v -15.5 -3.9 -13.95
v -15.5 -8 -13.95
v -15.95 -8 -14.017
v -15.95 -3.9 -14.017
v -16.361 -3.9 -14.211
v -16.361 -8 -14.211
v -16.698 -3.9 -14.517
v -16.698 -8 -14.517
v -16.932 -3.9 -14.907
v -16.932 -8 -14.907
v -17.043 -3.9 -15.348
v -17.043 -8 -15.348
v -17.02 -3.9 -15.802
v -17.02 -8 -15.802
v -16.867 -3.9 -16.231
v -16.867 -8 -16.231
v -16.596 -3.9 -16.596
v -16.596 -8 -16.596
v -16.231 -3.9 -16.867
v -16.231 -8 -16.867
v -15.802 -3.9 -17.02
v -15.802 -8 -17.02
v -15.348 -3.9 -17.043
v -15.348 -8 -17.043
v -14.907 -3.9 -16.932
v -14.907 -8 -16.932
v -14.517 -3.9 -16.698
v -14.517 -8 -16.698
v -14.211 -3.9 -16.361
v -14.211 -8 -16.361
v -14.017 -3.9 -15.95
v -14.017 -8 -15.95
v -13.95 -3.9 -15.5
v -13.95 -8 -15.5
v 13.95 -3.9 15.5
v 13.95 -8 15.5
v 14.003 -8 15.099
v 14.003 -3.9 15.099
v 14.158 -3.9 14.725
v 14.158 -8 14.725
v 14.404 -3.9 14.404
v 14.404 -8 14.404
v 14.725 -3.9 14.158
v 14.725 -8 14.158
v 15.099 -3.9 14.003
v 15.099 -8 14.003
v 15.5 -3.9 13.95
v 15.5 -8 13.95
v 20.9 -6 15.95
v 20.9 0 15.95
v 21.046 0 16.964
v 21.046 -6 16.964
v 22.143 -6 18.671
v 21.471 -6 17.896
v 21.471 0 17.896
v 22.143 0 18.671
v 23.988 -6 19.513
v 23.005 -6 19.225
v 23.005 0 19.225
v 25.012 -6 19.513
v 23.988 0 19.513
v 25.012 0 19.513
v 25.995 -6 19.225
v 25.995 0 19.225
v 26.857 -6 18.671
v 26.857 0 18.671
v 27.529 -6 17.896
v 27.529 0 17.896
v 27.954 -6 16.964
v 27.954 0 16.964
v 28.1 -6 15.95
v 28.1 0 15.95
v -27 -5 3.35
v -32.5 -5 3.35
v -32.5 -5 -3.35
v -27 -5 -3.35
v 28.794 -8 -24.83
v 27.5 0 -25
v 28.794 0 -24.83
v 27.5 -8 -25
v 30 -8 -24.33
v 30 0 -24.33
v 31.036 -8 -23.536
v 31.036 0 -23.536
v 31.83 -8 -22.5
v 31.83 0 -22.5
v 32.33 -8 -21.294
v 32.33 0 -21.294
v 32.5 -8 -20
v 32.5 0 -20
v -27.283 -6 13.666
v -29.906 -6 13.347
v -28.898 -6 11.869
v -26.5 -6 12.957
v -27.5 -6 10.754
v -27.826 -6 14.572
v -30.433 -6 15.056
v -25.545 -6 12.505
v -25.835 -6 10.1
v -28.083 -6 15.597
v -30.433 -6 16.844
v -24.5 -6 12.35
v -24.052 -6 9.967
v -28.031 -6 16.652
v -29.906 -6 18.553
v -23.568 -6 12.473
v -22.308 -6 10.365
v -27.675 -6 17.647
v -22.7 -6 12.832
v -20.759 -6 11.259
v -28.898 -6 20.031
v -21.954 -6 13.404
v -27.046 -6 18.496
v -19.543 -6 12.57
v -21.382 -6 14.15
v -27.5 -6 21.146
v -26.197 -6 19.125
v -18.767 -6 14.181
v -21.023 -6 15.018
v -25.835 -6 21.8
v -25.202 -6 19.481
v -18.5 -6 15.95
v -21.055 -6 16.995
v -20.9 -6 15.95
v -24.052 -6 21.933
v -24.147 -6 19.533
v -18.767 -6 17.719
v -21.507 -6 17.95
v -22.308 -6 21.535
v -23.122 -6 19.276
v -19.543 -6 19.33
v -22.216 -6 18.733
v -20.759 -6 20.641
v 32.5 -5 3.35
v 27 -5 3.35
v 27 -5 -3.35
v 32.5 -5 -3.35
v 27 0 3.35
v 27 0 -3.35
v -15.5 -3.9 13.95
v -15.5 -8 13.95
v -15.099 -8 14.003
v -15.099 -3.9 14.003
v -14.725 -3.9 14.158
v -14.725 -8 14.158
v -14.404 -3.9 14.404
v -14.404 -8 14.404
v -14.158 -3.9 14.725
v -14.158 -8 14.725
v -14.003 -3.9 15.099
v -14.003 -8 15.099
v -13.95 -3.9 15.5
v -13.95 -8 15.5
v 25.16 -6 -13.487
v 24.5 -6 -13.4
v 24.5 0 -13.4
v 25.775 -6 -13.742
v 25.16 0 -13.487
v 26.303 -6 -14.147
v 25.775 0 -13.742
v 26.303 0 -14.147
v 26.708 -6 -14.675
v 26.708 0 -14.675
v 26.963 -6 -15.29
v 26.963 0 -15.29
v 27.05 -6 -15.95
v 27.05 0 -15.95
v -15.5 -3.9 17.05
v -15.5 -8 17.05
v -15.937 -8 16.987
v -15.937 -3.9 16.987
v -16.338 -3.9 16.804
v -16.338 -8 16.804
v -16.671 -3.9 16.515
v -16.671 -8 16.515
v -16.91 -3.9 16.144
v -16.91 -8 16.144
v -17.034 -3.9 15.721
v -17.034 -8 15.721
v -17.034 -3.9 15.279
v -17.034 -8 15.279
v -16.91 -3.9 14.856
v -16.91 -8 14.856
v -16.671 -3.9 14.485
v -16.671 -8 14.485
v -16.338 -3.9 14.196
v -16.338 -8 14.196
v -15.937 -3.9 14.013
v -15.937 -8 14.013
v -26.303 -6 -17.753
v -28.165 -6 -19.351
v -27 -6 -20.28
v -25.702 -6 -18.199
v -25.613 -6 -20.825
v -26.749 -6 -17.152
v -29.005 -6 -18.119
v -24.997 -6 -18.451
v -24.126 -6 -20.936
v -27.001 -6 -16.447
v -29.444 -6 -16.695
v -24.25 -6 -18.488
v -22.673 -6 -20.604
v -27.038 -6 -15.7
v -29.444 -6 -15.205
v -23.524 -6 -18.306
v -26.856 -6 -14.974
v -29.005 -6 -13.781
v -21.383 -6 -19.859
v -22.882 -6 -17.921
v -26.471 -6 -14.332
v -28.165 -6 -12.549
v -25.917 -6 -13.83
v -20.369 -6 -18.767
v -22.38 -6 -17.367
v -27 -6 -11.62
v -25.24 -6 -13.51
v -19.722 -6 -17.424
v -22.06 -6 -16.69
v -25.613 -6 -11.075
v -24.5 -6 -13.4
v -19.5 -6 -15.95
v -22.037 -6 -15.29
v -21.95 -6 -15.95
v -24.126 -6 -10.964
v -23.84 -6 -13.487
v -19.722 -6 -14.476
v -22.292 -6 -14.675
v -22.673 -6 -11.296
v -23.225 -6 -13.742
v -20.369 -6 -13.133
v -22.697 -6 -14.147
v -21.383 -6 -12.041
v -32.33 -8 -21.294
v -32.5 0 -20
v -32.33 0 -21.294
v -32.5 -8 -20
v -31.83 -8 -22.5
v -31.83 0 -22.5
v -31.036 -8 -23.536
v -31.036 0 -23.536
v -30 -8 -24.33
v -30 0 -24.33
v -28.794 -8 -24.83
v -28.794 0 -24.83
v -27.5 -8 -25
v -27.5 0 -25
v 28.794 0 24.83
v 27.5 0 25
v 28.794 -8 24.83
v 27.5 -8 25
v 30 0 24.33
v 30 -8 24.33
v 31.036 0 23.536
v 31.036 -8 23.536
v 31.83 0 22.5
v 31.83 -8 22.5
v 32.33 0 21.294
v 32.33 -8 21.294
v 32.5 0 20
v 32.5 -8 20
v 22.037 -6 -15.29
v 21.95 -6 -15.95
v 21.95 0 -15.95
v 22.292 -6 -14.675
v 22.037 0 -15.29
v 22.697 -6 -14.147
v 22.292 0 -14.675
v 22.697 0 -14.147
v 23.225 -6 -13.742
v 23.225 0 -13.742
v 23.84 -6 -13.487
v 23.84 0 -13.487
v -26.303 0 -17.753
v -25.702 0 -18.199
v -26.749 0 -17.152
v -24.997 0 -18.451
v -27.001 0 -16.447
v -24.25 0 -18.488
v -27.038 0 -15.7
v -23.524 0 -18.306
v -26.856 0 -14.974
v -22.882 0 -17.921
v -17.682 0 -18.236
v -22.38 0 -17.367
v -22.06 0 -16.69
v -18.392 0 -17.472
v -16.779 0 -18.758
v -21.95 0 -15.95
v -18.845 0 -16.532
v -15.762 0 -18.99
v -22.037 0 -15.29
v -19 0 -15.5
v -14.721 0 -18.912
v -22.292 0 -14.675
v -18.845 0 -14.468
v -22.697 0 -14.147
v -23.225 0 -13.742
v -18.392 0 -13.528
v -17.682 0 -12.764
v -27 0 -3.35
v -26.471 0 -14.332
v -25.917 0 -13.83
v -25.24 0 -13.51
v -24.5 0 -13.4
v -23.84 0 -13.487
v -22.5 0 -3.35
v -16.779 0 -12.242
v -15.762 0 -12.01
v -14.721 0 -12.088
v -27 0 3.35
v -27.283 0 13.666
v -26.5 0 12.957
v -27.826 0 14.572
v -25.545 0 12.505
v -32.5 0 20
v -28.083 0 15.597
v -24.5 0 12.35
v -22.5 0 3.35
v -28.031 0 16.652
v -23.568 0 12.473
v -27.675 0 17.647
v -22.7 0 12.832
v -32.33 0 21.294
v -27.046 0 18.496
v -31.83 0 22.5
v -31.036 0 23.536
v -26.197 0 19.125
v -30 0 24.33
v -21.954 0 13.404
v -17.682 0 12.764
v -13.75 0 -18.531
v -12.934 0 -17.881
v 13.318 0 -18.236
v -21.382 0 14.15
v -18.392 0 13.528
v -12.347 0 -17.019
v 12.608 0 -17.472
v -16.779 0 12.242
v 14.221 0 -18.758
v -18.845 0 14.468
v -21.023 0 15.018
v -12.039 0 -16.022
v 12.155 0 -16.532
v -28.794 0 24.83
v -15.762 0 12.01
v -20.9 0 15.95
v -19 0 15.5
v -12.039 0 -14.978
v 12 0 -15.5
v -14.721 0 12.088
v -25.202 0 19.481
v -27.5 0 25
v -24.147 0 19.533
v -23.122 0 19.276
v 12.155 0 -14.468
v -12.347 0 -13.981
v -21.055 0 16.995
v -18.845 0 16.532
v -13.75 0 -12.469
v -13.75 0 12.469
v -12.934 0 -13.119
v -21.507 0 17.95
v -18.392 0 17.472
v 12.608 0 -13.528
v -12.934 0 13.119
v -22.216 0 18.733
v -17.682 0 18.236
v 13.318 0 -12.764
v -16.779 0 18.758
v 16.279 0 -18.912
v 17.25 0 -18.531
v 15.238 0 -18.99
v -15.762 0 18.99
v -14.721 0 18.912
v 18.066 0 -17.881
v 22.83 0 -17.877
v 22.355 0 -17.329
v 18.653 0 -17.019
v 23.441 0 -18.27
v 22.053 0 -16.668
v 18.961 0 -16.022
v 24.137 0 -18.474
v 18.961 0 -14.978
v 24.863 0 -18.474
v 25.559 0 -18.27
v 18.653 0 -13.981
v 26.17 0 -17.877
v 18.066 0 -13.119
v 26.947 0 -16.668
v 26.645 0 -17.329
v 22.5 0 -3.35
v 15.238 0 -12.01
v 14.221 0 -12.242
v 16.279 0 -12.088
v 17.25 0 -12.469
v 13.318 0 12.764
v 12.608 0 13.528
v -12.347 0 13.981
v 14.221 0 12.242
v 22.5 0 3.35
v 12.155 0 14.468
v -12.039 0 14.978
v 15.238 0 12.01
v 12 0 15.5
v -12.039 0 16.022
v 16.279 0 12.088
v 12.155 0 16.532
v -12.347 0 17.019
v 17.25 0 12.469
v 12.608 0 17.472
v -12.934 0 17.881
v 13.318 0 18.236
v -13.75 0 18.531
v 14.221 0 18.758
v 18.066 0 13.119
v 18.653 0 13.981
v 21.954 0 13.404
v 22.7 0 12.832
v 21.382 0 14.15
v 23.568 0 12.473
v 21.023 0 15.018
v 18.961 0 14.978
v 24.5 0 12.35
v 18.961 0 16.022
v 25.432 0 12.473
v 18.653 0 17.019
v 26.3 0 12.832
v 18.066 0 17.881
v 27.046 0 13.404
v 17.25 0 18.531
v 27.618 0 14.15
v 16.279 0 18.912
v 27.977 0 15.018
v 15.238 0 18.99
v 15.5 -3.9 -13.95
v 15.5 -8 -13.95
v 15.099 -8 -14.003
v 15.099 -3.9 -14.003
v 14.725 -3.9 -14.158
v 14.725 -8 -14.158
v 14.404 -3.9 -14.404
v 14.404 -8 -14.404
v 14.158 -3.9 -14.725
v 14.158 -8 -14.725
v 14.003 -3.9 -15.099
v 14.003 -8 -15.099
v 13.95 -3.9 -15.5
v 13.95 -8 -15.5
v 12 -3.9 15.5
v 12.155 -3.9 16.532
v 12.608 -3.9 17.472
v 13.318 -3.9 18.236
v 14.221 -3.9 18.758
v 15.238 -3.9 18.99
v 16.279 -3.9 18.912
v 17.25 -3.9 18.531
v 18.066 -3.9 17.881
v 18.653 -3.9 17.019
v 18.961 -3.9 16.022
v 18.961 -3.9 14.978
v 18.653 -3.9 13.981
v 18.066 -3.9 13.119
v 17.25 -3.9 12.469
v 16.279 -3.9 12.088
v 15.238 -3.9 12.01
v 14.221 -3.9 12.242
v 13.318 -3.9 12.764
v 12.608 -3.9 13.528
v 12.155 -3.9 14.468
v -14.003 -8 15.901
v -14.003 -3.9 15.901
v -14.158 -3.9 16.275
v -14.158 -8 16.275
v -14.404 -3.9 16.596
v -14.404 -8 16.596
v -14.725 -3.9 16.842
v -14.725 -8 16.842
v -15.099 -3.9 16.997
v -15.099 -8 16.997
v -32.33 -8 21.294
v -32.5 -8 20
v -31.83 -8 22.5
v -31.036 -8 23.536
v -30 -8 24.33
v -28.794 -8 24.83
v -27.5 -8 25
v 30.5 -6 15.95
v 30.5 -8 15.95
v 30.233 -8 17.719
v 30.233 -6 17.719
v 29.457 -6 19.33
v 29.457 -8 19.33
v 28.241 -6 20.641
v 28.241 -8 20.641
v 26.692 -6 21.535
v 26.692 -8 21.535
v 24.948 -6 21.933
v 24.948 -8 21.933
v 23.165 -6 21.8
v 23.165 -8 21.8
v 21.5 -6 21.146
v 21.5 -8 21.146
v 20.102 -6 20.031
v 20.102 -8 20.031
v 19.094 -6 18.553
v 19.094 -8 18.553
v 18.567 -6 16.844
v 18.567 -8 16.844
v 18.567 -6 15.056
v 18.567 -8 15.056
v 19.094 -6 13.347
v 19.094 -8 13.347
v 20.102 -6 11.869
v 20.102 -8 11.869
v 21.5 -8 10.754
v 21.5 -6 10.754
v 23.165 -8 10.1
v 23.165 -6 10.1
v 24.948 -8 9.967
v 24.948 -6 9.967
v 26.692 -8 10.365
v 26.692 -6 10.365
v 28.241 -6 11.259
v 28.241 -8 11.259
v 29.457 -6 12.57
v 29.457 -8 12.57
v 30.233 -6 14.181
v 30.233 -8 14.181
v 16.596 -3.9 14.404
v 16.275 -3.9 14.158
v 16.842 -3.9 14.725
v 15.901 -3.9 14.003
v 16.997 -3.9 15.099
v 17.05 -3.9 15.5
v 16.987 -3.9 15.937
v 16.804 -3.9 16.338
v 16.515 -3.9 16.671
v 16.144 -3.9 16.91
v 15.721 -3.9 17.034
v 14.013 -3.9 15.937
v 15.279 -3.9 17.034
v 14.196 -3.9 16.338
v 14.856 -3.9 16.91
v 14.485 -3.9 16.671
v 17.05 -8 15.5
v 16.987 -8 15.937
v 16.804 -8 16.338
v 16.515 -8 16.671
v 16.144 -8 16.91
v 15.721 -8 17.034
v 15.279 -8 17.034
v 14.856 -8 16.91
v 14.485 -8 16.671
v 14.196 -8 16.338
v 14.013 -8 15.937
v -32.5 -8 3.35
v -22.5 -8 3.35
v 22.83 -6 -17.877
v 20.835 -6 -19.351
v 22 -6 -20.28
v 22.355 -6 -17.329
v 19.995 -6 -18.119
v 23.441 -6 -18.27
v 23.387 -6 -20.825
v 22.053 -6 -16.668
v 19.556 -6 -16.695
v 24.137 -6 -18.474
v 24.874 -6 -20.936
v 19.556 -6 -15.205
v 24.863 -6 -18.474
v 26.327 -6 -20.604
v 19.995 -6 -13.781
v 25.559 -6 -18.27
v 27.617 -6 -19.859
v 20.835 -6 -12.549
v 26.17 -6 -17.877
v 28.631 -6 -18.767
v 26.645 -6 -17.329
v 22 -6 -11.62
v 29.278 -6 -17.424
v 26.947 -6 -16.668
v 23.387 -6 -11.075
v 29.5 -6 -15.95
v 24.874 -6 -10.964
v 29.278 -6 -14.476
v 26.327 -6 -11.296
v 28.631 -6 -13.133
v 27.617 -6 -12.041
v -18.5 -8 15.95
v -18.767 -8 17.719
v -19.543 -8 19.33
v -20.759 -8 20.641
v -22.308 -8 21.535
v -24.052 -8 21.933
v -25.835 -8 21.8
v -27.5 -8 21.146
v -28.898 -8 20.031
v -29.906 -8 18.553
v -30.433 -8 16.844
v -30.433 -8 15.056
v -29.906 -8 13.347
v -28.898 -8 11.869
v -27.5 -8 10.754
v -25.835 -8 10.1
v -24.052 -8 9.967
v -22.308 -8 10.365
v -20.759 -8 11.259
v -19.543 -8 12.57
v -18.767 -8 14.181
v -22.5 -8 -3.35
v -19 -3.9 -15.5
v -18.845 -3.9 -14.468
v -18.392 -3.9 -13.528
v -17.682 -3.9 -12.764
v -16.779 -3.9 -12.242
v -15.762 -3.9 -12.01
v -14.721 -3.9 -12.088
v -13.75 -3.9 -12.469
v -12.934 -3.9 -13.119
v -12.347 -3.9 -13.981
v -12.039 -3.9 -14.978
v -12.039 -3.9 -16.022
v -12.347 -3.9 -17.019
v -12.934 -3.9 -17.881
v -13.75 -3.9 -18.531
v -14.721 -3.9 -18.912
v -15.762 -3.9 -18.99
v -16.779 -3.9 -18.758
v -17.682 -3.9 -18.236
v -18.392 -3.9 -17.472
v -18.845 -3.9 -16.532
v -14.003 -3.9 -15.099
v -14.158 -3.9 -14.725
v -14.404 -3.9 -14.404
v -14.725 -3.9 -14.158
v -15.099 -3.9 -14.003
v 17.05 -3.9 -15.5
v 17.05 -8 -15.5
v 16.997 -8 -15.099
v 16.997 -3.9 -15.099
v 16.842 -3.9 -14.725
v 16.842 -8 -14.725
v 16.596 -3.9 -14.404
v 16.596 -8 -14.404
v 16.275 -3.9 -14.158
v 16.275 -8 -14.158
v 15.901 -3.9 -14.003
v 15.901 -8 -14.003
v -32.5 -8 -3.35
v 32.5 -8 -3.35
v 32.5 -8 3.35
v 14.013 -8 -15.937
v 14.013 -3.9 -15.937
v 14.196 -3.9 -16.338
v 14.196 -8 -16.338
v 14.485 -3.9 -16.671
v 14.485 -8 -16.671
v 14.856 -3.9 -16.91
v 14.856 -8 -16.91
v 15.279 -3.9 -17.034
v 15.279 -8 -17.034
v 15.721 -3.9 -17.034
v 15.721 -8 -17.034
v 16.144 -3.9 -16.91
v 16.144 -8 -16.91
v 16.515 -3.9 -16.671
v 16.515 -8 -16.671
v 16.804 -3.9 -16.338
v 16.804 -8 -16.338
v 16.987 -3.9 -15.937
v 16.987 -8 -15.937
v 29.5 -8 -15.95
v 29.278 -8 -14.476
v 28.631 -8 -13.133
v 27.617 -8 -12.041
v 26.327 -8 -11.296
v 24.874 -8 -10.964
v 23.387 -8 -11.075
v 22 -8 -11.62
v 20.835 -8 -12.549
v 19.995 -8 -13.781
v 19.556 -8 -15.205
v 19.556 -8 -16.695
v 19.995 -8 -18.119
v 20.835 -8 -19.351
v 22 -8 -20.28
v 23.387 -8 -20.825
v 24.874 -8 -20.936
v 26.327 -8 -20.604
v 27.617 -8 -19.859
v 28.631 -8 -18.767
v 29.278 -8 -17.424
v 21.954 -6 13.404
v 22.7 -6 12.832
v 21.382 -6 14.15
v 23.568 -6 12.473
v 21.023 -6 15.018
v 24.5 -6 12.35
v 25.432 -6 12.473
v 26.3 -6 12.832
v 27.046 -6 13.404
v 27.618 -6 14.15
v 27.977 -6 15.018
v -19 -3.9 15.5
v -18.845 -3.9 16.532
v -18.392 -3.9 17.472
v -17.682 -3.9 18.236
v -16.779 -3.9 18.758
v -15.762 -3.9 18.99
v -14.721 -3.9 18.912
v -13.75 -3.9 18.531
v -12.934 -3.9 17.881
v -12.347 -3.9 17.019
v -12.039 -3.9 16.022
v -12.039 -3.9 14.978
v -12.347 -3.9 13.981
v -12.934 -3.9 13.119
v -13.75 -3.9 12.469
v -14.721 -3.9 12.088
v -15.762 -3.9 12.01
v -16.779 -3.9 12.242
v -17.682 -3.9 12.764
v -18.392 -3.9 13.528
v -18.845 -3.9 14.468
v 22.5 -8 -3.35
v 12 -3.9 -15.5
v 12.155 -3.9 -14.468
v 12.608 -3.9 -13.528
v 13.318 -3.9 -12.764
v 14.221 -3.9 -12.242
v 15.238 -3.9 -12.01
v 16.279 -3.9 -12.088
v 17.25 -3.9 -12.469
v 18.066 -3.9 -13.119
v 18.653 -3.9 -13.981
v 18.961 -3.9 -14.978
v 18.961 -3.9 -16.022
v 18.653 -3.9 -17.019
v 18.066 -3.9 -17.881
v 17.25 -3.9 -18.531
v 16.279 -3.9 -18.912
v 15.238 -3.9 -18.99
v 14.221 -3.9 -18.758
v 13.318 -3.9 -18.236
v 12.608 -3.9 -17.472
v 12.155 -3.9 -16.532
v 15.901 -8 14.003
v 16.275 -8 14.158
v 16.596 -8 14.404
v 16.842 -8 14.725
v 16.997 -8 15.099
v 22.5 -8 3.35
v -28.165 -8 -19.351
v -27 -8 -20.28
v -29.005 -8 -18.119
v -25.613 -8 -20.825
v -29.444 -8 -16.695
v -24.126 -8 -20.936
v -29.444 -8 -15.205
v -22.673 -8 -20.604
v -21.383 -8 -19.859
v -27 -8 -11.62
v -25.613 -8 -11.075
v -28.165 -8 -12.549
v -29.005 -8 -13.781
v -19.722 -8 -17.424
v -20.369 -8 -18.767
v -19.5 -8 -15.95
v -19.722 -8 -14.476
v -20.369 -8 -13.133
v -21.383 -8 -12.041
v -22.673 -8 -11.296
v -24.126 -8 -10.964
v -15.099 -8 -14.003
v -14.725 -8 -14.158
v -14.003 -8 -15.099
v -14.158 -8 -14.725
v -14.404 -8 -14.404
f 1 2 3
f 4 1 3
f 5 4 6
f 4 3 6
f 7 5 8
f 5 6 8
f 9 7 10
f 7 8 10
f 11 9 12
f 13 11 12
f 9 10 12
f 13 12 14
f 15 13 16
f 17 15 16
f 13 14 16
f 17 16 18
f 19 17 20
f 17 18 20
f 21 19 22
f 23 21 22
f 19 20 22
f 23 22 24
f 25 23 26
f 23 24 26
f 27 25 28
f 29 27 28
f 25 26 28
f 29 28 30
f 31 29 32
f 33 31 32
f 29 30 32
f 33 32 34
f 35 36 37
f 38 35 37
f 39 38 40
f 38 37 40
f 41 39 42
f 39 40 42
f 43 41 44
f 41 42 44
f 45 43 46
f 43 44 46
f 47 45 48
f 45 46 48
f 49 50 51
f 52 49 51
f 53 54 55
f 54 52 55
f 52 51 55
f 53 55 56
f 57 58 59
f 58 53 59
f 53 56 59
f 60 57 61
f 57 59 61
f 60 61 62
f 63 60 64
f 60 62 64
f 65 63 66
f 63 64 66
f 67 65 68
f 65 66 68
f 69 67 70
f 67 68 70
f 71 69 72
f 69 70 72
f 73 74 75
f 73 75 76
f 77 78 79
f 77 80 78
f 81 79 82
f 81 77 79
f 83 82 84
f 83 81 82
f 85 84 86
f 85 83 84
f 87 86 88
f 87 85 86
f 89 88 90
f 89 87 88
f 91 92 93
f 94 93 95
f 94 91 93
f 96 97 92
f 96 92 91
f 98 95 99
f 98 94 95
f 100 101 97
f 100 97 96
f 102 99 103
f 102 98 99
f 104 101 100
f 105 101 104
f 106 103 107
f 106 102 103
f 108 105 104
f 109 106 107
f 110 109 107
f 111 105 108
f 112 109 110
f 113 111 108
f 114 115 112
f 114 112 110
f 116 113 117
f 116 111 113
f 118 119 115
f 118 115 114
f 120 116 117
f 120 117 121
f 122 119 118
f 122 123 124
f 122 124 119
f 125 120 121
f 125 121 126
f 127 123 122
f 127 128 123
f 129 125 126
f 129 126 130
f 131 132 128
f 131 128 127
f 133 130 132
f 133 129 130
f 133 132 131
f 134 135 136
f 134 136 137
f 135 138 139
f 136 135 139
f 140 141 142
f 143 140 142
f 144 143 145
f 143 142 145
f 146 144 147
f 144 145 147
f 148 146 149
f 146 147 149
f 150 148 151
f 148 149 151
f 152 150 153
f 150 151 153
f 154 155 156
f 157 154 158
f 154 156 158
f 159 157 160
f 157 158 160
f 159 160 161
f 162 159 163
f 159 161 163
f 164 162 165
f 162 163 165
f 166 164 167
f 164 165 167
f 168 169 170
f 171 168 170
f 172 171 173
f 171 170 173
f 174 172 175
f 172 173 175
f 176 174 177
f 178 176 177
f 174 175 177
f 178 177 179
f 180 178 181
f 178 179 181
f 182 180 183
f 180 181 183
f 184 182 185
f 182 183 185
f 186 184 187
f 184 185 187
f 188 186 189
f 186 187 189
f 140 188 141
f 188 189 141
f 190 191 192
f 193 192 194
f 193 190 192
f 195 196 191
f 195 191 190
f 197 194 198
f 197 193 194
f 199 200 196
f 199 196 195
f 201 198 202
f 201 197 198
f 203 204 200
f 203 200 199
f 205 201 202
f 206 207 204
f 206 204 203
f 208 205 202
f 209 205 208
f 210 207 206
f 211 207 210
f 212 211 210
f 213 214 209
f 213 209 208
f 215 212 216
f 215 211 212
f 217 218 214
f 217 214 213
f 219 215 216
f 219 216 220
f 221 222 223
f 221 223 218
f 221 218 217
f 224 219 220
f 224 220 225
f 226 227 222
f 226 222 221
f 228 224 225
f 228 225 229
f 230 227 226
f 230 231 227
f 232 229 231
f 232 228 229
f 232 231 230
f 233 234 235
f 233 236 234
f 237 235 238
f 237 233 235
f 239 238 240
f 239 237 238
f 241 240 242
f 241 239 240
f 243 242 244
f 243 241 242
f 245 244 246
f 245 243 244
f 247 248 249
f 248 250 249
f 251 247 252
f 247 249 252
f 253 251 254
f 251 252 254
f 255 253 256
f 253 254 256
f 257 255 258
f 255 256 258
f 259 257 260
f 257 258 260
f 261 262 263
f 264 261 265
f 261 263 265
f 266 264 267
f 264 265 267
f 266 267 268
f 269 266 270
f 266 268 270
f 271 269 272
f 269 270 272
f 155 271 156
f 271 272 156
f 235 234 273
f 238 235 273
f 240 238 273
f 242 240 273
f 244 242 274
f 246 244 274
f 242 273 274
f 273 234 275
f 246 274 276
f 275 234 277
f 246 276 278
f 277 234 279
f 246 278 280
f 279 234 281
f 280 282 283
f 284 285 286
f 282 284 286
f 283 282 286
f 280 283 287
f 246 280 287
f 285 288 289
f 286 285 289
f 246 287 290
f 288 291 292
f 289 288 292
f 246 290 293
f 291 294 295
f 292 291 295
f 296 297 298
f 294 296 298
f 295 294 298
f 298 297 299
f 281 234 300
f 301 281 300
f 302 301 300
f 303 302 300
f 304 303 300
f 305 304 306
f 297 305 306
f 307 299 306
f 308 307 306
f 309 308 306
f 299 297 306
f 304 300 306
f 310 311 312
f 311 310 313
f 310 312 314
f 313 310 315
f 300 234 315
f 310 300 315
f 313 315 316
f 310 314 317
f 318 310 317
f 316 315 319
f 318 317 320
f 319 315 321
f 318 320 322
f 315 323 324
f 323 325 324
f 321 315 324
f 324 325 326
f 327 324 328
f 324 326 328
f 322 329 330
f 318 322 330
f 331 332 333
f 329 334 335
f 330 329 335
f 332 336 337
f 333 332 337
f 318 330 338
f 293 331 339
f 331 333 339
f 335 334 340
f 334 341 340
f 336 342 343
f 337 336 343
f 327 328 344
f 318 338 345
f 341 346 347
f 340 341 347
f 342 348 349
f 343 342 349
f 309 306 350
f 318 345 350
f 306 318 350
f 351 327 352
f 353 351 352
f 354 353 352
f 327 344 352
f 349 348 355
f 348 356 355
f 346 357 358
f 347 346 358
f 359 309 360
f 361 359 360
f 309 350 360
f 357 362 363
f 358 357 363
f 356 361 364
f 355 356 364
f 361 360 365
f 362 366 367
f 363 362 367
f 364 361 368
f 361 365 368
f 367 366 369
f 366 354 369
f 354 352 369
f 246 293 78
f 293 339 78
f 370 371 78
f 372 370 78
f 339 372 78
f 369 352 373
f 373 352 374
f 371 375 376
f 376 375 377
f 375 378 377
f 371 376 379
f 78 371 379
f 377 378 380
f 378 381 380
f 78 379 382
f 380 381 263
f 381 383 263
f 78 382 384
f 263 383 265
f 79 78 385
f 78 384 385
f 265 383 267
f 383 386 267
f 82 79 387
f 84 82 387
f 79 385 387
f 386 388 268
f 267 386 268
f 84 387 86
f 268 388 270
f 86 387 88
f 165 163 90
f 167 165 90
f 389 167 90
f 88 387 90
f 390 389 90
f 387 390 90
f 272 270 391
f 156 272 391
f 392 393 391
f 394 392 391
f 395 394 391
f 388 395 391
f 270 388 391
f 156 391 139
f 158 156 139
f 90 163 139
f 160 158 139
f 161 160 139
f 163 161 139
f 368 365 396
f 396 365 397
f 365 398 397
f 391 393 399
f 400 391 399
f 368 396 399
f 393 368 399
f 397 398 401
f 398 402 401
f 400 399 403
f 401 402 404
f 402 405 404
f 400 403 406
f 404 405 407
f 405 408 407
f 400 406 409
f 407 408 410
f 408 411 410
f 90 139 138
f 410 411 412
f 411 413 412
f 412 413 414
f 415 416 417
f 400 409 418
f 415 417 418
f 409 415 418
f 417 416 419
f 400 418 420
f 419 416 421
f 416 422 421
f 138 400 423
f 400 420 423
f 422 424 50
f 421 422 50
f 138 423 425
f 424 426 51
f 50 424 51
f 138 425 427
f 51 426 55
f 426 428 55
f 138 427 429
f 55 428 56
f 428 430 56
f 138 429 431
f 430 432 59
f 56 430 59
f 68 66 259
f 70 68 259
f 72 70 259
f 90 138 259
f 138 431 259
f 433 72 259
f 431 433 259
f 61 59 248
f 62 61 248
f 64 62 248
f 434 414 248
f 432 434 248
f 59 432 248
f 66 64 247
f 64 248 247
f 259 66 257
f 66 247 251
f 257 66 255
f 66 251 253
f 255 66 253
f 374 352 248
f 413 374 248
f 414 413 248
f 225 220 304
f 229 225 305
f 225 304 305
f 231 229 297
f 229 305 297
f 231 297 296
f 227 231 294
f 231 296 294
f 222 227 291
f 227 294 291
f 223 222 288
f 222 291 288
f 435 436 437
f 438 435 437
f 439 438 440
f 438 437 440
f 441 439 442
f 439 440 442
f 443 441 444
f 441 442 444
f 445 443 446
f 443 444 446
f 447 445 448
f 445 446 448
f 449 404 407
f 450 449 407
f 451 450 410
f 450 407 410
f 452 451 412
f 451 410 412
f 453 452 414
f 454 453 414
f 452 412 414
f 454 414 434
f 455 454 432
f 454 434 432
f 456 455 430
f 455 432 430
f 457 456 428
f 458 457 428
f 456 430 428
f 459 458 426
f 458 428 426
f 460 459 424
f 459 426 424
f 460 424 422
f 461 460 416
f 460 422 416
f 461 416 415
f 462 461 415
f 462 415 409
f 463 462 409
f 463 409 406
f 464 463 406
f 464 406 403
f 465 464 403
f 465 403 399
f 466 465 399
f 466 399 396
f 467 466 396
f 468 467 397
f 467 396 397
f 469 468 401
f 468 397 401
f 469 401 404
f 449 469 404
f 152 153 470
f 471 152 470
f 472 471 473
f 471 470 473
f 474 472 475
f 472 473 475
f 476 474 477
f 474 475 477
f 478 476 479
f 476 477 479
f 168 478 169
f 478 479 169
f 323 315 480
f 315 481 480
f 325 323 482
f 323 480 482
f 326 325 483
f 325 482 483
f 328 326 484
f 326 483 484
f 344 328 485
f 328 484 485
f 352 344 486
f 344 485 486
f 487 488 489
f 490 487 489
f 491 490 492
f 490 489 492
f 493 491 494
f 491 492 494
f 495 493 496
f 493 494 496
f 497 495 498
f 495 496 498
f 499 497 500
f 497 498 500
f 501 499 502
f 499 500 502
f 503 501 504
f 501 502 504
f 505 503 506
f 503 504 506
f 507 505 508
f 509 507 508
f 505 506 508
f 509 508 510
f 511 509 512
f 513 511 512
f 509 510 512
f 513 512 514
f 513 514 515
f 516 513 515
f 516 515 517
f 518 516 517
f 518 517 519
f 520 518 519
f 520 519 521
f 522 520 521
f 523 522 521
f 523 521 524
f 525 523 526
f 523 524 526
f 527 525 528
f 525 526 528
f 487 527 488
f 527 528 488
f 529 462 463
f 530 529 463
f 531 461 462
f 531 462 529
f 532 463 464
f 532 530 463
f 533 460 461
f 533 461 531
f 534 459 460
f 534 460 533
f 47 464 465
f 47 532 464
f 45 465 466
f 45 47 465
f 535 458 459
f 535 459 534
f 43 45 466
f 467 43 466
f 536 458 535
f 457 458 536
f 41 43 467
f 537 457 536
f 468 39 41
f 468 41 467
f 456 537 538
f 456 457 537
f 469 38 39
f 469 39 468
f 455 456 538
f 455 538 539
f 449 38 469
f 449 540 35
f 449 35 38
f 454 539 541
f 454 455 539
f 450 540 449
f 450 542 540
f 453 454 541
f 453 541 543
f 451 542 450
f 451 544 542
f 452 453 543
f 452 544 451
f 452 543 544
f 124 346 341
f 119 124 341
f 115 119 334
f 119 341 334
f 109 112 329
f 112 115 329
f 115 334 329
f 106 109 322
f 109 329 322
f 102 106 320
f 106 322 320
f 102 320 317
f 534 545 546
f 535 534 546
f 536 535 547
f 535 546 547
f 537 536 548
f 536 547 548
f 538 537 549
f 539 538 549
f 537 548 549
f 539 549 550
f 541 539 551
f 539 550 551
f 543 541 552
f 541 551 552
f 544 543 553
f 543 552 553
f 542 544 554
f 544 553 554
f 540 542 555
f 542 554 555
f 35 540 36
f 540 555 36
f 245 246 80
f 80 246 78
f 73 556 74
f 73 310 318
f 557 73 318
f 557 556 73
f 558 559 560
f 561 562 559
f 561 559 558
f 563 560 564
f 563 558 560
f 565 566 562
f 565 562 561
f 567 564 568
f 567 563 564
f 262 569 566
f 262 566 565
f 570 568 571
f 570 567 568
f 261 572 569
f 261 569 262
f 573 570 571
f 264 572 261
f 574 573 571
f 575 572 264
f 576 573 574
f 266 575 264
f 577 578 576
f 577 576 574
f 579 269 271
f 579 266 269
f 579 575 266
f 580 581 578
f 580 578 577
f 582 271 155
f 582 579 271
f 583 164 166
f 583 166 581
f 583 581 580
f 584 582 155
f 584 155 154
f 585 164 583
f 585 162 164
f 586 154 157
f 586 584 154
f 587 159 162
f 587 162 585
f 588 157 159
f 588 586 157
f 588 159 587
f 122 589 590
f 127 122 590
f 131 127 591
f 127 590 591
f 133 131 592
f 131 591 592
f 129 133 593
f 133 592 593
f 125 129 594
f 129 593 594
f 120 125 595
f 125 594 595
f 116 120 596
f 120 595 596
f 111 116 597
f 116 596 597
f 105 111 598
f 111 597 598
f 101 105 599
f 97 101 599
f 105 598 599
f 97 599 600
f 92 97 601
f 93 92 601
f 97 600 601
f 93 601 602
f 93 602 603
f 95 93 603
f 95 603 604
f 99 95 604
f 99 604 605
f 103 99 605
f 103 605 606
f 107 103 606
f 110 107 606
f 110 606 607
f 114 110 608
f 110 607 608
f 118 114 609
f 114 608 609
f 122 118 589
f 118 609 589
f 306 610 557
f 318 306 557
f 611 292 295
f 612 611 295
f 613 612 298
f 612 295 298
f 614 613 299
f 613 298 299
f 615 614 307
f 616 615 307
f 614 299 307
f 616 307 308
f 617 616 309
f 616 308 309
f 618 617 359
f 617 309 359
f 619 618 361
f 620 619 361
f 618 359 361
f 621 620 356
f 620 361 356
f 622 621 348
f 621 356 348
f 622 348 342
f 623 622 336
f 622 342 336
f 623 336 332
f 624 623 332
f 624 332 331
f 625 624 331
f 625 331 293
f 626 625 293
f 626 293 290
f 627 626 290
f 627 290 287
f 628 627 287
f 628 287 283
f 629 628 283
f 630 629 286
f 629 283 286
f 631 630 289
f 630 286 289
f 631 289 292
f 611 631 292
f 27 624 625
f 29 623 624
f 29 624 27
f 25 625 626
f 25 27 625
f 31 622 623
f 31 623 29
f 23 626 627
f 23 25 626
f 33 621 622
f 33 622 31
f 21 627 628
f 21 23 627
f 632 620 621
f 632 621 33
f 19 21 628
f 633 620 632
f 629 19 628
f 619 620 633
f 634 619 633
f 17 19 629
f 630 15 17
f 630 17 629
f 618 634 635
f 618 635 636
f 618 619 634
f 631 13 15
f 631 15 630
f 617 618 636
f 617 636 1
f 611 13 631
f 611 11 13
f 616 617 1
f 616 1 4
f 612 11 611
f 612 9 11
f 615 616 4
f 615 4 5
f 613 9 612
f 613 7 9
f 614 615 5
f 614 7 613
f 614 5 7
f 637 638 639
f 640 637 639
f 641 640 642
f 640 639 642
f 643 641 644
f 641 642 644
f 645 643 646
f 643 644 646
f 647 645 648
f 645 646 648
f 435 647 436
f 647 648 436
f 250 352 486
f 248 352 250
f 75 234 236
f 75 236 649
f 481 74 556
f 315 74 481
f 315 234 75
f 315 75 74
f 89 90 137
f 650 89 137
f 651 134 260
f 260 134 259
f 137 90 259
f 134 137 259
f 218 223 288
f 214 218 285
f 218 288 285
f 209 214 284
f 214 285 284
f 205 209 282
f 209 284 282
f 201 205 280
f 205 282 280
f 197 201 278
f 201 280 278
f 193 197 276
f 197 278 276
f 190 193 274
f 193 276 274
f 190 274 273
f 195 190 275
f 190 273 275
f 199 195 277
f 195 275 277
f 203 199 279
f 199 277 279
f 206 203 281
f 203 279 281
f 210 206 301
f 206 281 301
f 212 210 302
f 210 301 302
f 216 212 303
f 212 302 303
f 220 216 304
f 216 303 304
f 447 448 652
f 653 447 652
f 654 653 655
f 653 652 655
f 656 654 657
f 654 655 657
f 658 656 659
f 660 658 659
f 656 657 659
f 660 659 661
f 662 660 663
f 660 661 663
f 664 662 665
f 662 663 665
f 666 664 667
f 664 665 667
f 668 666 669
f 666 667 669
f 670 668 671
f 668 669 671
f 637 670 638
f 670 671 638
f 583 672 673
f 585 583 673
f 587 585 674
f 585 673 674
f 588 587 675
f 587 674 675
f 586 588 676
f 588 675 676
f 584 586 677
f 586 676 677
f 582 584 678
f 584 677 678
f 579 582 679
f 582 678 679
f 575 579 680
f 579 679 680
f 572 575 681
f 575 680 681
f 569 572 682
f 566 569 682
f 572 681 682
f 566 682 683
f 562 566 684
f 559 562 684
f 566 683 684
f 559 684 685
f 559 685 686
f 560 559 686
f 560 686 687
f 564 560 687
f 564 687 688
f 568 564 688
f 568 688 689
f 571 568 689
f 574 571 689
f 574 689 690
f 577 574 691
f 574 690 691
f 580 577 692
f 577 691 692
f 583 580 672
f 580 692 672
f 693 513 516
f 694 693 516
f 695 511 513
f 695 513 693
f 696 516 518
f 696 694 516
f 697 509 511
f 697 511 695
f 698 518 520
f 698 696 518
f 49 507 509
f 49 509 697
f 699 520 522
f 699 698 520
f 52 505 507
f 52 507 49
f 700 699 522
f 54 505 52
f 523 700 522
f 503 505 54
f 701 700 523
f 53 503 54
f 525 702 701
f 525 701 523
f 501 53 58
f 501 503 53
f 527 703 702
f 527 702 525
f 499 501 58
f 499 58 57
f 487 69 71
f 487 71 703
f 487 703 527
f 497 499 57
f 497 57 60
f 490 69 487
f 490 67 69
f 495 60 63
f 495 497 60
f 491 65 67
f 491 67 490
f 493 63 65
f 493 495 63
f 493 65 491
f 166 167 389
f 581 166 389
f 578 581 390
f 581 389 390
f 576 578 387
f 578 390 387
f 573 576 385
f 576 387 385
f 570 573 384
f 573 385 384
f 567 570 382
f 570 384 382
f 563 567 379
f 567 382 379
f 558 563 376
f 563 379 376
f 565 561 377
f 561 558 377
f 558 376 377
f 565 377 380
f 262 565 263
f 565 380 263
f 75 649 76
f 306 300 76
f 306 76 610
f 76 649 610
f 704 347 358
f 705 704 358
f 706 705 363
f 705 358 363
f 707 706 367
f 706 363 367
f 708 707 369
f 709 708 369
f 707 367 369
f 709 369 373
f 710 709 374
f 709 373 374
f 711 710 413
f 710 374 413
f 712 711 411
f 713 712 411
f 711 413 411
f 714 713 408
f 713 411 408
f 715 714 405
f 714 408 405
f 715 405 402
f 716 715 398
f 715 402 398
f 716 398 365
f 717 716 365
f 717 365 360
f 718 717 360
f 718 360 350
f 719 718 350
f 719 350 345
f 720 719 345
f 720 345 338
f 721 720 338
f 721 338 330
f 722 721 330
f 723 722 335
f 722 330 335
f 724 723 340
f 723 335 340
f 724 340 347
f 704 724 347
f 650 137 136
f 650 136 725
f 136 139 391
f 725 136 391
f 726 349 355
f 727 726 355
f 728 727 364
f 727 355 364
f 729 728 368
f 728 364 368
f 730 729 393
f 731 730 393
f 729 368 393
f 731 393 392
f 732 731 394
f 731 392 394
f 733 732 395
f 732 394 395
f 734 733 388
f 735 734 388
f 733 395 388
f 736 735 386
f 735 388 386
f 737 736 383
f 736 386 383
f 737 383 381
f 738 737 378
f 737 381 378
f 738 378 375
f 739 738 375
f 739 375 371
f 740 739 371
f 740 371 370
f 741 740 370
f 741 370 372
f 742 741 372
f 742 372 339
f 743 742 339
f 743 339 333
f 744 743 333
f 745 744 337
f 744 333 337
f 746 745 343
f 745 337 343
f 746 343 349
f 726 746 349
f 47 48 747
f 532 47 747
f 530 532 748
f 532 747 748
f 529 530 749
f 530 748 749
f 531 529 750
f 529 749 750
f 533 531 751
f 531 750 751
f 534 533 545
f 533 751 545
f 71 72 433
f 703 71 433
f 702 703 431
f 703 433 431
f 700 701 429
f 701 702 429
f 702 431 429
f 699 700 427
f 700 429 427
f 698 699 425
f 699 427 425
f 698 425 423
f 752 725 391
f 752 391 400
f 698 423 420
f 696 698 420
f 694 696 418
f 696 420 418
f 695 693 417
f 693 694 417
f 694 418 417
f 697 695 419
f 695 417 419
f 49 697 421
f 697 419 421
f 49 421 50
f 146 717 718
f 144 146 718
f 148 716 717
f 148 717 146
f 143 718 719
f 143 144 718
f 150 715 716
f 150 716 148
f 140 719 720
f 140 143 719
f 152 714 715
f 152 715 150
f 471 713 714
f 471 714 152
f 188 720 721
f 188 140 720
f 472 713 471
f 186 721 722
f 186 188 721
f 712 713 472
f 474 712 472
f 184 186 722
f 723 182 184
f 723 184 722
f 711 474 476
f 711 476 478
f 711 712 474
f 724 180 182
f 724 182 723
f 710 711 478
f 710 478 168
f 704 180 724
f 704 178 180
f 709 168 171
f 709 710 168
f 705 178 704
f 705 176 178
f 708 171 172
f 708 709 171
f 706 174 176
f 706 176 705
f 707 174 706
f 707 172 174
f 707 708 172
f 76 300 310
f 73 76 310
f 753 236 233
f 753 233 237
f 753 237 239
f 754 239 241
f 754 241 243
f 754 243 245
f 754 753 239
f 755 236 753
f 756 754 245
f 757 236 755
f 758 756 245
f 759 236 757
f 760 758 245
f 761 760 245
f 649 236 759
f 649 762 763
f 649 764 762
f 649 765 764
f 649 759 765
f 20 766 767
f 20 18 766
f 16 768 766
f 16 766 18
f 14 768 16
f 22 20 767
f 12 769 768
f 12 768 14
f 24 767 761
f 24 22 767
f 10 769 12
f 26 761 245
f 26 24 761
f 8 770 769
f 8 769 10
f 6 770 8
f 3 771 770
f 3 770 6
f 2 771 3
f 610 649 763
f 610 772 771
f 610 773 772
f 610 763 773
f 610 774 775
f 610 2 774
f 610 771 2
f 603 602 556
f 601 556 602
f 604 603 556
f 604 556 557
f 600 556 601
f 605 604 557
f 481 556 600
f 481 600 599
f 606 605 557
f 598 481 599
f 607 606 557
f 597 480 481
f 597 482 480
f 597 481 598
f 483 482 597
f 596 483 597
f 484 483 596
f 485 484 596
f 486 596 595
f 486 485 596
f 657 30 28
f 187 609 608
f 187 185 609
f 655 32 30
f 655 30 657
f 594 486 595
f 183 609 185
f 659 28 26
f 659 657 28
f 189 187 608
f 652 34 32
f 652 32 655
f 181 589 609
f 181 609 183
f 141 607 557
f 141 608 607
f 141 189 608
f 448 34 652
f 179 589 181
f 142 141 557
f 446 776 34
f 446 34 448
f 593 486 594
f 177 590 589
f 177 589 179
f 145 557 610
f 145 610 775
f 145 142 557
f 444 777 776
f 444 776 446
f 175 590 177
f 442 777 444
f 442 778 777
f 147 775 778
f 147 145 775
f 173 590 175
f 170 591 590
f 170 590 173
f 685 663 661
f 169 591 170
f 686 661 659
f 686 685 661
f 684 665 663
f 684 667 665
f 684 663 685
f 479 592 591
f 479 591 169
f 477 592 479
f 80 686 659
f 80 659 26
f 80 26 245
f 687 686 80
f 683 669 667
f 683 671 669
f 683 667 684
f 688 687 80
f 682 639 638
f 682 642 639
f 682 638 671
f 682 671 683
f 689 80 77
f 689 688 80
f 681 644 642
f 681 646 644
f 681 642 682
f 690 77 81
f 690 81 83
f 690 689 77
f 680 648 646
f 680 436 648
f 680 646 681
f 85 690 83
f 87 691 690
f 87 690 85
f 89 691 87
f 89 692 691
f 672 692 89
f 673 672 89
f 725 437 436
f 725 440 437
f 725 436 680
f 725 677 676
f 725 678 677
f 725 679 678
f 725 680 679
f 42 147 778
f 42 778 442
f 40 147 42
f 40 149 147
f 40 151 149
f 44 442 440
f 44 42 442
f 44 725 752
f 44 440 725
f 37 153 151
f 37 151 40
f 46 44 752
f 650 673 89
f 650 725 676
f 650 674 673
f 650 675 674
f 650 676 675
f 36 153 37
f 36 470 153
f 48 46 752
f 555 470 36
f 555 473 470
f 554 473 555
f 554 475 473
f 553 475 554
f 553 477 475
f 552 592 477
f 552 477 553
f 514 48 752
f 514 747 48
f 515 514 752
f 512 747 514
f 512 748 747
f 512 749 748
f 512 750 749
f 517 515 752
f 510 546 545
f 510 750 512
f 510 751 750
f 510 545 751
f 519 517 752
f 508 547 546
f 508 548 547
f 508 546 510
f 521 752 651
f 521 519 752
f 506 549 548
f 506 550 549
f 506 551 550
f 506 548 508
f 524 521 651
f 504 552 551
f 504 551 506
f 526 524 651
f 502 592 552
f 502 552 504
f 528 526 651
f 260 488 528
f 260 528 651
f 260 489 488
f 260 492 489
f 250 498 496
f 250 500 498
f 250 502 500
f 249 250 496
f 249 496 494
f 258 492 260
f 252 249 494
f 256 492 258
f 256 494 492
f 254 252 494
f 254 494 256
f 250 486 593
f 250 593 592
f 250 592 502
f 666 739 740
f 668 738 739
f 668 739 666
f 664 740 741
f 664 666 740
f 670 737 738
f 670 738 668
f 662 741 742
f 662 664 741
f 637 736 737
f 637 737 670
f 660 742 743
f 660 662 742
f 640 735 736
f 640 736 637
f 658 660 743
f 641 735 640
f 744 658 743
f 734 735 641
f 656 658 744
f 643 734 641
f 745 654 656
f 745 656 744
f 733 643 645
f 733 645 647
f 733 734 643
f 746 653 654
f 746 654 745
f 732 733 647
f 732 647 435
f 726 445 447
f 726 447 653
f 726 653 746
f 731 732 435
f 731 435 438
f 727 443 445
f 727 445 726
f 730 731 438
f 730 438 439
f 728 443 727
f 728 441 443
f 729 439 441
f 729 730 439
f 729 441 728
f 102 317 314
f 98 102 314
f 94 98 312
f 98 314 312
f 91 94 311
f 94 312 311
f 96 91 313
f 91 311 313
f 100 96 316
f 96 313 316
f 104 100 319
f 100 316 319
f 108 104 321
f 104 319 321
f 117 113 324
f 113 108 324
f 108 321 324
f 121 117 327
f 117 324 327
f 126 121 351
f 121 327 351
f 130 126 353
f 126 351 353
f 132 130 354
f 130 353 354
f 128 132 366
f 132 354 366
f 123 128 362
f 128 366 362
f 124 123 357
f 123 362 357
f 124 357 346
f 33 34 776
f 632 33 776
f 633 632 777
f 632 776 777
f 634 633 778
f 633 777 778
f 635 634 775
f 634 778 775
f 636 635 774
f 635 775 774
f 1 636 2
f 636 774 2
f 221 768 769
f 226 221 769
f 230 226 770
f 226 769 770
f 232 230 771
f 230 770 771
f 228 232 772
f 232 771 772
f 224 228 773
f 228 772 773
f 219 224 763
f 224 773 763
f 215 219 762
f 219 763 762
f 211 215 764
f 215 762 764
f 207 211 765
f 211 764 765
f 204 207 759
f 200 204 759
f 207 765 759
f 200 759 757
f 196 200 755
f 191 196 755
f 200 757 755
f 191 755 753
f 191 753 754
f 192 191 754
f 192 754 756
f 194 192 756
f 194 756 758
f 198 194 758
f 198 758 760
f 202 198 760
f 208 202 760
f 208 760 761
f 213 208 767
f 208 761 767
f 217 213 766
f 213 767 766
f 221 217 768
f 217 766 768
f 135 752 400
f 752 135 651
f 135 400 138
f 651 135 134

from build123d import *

# Parameters (mm, degrees)
F0_W     = 65
F0_H     = 50
F0_W_2   = 45
F0_H_2   = 6.7
F1_DEPTH = 8
F2_R     = 6
F2_R_2   = 3.6
F2_R_3   = 5
F2_R_4   = 2.55
F3_DEPTH = 2
F4_W     = 5.5
F4_H     = 6.7
F5_DEPTH = 3
F7_DEPTH = 7
F8_R     = 3.5
F9_DEPTH = 3.9
F10_R    = 5


with BuildPart() as f1:
    # F0 (on Front) → F1 (new body)
    with BuildSketch(Plane.XZ):
        Rectangle(F0_W, F0_H)
        with BuildLine():
            ThreePointArc((-24.5, 12.35), (-27.0455844123, 18.4955844123), (-20.9, 15.95))
            Line((-20.9, 15.95), (20.9, 15.95))
            ThreePointArc((20.9, 15.95), (24.5, 19.55), (28.1, 15.95))
            ThreePointArc((28.1, 15.95), (27.0455844123, 13.4044155877), (24.5, 12.35))
            Line((24.5, 12.35), (24.5, 3.35))
            Line((24.5, 3.35), (27, 3.35))
            Line((27, 3.35), (27, -3.35))
            Line((27, -3.35), (24.5, -3.35))
            Line((24.5, -3.35), (24.5, -13.4))
            ThreePointArc((24.5, -13.4), (26.303122292, -14.146877708), (27.05, -15.95))
            ThreePointArc((27.05, -15.95), (24.5, -18.5), (21.95, -15.95))
            Line((21.95, -15.95), (-21.95, -15.95))
            ThreePointArc((-21.95, -15.95), (-26.303122292, -17.753122292), (-24.5, -13.4))
            Line((-24.5, -13.4), (-24.5, -3.35))
            Line((-24.5, -3.35), (-27, -3.35))
            Line((-27, -3.35), (-27, 3.35))
            Line((-27, 3.35), (-24.5, 3.35))
            Line((-24.5, 3.35), (-24.5, 12.35))
        make_face(mode=Mode.SUBTRACT)
        with BuildLine():
            Line((20.9, 15.95), (-20.9, 15.95))
            ThreePointArc((-20.9, 15.95), (-21.9544155877, 13.4044155877), (-24.5, 12.35))
            Line((-24.5, 12.35), (-24.5, 3.35))
            Line((-24.5, 3.35), (-22.5, 3.35))
            Line((-22.5, 3.35), (22.5, 3.35))
            Line((22.5, 3.35), (24.5, 3.35))
            Line((24.5, 3.35), (24.5, 12.35))
            ThreePointArc((24.5, 12.35), (21.9544155877, 13.4044155877), (20.9, 15.95))
        make_face()
        with BuildLine():
            Line((-22.5, -3.35), (-24.5, -3.35))
            Line((-24.5, -3.35), (-24.5, -13.4))
            ThreePointArc((-24.5, -13.4), (-22.696877708, -14.146877708), (-21.95, -15.95))
            Line((-21.95, -15.95), (21.95, -15.95))
            ThreePointArc((21.95, -15.95), (22.696877708, -14.146877708), (24.5, -13.4))
            Line((24.5, -13.4), (24.5, -3.35))
            Line((24.5, -3.35), (22.5, -3.35))
            Line((22.5, -3.35), (-22.5, -3.35))
        make_face()
        Rectangle(F0_W_2, F0_H_2)
    extrude(amount=F1_DEPTH)

    # F2 (on face) → F3 (cut)
    with BuildSketch(Plane.XZ.offset(8)):
        with Locations((24.5, 15.95)):
            Circle(F2_R)
        with Locations((24.5, 15.95)):
            Circle(F2_R_2, mode=Mode.SUBTRACT)
        with Locations((-24.5, 15.95)):
            Circle(F2_R)
        with Locations((-24.5, 15.95)):
            Circle(F2_R_2, mode=Mode.SUBTRACT)
        with Locations((-24.5, -15.95)):
            Circle(F2_R_3)
        with Locations((-24.5, -15.95)):
            Circle(F2_R_4, mode=Mode.SUBTRACT)
        with Locations((24.5, -15.95)):
            Circle(F2_R_3)
        with Locations((24.5, -15.95)):
            Circle(F2_R_4, mode=Mode.SUBTRACT)
    extrude(amount=-F3_DEPTH, mode=Mode.SUBTRACT)

    # F4 (on face) → F5 (cut)
    with BuildSketch(Plane.XZ.offset(8)):
        with Locations((29.75, 0)):
            Rectangle(F4_W, F4_H)
        with Locations((-29.75, 0)):
            Rectangle(F4_W, F4_H)
    extrude(amount=-F5_DEPTH, mode=Mode.SUBTRACT)

    # F6 (on face) → F7 (cut)
    with BuildSketch(Plane.XZ.offset(8)):
        with BuildLine():
            Line((-15.5, 17.05), (-15.5, 15.5))
            Line((-15.5, 15.5), (-13.95, 15.5))
            ThreePointArc((-13.95, 15.5), (-14.4039844892, 16.5960155108), (-15.5, 17.05))
        make_face()
        with BuildLine():
            Line((-13.95, 15.5), (-15.5, 15.5))
            Line((-15.5, 15.5), (-15.5, 13.95))
            ThreePointArc((-15.5, 13.95), (-14.4039844892, 14.4039844892), (-13.95, 15.5))
        make_face()
        with BuildLine():
            ThreePointArc((17.05, 15.5), (15.5, 17.05), (13.95, 15.5))
            Line((13.95, 15.5), (15.5, 15.5))
            Line((15.5, 15.5), (15.5, 13.95))
            ThreePointArc((15.5, 13.95), (16.5960155108, 14.4039844892), (17.05, 15.5))
        make_face()
        with BuildLine():
            Line((15.5, 15.5), (13.95, 15.5))
            ThreePointArc((13.95, 15.5), (14.4039844892, 14.4039844892), (15.5, 13.95))
            Line((15.5, 13.95), (15.5, 15.5))
        make_face()
        with BuildLine():
            Line((-15.5, -15.5), (-15.5, -13.95))
            ThreePointArc((-15.5, -13.95), (-16.5960155108, -16.5960155108), (-13.95, -15.5))
            Line((-13.95, -15.5), (-15.5, -15.5))
        make_face()
        with BuildLine():
            ThreePointArc((-13.95, -15.5), (-14.4039844892, -14.4039844892), (-15.5, -13.95))
            Line((-15.5, -13.95), (-15.5, -15.5))
            Line((-15.5, -15.5), (-13.95, -15.5))
        make_face()
        with BuildLine():
            Line((15.5, -15.5), (15.5, -13.95))
            ThreePointArc((15.5, -13.95), (14.4039844892, -14.4039844892), (13.95, -15.5))
            Line((13.95, -15.5), (15.5, -15.5))
        make_face()
        with BuildLine():
            ThreePointArc((17.05, -15.5), (16.5960155108, -14.4039844892), (15.5, -13.95))
            Line((15.5, -13.95), (15.5, -15.5))
            Line((15.5, -15.5), (13.95, -15.5))
            ThreePointArc((13.95, -15.5), (15.5, -17.05), (17.05, -15.5))
        make_face()
        with BuildLine():
            Line((-15.5, 13.95), (-15.5, 15.5))
            Line((-15.5, 15.5), (-15.5, 17.05))
            ThreePointArc((-15.5, 17.05), (-17.05, 15.5), (-15.5, 13.95))
        make_face()
    extrude(amount=-F7_DEPTH, mode=Mode.SUBTRACT)

    # F8 (on face) → F9 (cut)
    with BuildSketch(Plane(origin=(0, 0, 0), x_dir=(-1, 0, 0), z_dir=(0, 1, 0))):
        with Locations((-15.5, 15.5)):
            Circle(F8_R)
        with Locations((-15.5, -15.5)):
            Circle(F8_R)
        with Locations((15.5, 15.5)):
            Circle(F8_R)
        with Locations((15.5, -15.5)):
            Circle(F8_R)
    extrude(amount=-F9_DEPTH, mode=Mode.SUBTRACT)

    # F10
    f10_edges = [f1.edges().sort_by_distance(p)[0] for p in [
        (32.5, -4, 25),
        (32.5, -4, -25),
        (-32.5, -4, 25),
        (-32.5, -4, -25),
    ]]
    fillet(f10_edges, radius=F10_R)


solid = f1.part
